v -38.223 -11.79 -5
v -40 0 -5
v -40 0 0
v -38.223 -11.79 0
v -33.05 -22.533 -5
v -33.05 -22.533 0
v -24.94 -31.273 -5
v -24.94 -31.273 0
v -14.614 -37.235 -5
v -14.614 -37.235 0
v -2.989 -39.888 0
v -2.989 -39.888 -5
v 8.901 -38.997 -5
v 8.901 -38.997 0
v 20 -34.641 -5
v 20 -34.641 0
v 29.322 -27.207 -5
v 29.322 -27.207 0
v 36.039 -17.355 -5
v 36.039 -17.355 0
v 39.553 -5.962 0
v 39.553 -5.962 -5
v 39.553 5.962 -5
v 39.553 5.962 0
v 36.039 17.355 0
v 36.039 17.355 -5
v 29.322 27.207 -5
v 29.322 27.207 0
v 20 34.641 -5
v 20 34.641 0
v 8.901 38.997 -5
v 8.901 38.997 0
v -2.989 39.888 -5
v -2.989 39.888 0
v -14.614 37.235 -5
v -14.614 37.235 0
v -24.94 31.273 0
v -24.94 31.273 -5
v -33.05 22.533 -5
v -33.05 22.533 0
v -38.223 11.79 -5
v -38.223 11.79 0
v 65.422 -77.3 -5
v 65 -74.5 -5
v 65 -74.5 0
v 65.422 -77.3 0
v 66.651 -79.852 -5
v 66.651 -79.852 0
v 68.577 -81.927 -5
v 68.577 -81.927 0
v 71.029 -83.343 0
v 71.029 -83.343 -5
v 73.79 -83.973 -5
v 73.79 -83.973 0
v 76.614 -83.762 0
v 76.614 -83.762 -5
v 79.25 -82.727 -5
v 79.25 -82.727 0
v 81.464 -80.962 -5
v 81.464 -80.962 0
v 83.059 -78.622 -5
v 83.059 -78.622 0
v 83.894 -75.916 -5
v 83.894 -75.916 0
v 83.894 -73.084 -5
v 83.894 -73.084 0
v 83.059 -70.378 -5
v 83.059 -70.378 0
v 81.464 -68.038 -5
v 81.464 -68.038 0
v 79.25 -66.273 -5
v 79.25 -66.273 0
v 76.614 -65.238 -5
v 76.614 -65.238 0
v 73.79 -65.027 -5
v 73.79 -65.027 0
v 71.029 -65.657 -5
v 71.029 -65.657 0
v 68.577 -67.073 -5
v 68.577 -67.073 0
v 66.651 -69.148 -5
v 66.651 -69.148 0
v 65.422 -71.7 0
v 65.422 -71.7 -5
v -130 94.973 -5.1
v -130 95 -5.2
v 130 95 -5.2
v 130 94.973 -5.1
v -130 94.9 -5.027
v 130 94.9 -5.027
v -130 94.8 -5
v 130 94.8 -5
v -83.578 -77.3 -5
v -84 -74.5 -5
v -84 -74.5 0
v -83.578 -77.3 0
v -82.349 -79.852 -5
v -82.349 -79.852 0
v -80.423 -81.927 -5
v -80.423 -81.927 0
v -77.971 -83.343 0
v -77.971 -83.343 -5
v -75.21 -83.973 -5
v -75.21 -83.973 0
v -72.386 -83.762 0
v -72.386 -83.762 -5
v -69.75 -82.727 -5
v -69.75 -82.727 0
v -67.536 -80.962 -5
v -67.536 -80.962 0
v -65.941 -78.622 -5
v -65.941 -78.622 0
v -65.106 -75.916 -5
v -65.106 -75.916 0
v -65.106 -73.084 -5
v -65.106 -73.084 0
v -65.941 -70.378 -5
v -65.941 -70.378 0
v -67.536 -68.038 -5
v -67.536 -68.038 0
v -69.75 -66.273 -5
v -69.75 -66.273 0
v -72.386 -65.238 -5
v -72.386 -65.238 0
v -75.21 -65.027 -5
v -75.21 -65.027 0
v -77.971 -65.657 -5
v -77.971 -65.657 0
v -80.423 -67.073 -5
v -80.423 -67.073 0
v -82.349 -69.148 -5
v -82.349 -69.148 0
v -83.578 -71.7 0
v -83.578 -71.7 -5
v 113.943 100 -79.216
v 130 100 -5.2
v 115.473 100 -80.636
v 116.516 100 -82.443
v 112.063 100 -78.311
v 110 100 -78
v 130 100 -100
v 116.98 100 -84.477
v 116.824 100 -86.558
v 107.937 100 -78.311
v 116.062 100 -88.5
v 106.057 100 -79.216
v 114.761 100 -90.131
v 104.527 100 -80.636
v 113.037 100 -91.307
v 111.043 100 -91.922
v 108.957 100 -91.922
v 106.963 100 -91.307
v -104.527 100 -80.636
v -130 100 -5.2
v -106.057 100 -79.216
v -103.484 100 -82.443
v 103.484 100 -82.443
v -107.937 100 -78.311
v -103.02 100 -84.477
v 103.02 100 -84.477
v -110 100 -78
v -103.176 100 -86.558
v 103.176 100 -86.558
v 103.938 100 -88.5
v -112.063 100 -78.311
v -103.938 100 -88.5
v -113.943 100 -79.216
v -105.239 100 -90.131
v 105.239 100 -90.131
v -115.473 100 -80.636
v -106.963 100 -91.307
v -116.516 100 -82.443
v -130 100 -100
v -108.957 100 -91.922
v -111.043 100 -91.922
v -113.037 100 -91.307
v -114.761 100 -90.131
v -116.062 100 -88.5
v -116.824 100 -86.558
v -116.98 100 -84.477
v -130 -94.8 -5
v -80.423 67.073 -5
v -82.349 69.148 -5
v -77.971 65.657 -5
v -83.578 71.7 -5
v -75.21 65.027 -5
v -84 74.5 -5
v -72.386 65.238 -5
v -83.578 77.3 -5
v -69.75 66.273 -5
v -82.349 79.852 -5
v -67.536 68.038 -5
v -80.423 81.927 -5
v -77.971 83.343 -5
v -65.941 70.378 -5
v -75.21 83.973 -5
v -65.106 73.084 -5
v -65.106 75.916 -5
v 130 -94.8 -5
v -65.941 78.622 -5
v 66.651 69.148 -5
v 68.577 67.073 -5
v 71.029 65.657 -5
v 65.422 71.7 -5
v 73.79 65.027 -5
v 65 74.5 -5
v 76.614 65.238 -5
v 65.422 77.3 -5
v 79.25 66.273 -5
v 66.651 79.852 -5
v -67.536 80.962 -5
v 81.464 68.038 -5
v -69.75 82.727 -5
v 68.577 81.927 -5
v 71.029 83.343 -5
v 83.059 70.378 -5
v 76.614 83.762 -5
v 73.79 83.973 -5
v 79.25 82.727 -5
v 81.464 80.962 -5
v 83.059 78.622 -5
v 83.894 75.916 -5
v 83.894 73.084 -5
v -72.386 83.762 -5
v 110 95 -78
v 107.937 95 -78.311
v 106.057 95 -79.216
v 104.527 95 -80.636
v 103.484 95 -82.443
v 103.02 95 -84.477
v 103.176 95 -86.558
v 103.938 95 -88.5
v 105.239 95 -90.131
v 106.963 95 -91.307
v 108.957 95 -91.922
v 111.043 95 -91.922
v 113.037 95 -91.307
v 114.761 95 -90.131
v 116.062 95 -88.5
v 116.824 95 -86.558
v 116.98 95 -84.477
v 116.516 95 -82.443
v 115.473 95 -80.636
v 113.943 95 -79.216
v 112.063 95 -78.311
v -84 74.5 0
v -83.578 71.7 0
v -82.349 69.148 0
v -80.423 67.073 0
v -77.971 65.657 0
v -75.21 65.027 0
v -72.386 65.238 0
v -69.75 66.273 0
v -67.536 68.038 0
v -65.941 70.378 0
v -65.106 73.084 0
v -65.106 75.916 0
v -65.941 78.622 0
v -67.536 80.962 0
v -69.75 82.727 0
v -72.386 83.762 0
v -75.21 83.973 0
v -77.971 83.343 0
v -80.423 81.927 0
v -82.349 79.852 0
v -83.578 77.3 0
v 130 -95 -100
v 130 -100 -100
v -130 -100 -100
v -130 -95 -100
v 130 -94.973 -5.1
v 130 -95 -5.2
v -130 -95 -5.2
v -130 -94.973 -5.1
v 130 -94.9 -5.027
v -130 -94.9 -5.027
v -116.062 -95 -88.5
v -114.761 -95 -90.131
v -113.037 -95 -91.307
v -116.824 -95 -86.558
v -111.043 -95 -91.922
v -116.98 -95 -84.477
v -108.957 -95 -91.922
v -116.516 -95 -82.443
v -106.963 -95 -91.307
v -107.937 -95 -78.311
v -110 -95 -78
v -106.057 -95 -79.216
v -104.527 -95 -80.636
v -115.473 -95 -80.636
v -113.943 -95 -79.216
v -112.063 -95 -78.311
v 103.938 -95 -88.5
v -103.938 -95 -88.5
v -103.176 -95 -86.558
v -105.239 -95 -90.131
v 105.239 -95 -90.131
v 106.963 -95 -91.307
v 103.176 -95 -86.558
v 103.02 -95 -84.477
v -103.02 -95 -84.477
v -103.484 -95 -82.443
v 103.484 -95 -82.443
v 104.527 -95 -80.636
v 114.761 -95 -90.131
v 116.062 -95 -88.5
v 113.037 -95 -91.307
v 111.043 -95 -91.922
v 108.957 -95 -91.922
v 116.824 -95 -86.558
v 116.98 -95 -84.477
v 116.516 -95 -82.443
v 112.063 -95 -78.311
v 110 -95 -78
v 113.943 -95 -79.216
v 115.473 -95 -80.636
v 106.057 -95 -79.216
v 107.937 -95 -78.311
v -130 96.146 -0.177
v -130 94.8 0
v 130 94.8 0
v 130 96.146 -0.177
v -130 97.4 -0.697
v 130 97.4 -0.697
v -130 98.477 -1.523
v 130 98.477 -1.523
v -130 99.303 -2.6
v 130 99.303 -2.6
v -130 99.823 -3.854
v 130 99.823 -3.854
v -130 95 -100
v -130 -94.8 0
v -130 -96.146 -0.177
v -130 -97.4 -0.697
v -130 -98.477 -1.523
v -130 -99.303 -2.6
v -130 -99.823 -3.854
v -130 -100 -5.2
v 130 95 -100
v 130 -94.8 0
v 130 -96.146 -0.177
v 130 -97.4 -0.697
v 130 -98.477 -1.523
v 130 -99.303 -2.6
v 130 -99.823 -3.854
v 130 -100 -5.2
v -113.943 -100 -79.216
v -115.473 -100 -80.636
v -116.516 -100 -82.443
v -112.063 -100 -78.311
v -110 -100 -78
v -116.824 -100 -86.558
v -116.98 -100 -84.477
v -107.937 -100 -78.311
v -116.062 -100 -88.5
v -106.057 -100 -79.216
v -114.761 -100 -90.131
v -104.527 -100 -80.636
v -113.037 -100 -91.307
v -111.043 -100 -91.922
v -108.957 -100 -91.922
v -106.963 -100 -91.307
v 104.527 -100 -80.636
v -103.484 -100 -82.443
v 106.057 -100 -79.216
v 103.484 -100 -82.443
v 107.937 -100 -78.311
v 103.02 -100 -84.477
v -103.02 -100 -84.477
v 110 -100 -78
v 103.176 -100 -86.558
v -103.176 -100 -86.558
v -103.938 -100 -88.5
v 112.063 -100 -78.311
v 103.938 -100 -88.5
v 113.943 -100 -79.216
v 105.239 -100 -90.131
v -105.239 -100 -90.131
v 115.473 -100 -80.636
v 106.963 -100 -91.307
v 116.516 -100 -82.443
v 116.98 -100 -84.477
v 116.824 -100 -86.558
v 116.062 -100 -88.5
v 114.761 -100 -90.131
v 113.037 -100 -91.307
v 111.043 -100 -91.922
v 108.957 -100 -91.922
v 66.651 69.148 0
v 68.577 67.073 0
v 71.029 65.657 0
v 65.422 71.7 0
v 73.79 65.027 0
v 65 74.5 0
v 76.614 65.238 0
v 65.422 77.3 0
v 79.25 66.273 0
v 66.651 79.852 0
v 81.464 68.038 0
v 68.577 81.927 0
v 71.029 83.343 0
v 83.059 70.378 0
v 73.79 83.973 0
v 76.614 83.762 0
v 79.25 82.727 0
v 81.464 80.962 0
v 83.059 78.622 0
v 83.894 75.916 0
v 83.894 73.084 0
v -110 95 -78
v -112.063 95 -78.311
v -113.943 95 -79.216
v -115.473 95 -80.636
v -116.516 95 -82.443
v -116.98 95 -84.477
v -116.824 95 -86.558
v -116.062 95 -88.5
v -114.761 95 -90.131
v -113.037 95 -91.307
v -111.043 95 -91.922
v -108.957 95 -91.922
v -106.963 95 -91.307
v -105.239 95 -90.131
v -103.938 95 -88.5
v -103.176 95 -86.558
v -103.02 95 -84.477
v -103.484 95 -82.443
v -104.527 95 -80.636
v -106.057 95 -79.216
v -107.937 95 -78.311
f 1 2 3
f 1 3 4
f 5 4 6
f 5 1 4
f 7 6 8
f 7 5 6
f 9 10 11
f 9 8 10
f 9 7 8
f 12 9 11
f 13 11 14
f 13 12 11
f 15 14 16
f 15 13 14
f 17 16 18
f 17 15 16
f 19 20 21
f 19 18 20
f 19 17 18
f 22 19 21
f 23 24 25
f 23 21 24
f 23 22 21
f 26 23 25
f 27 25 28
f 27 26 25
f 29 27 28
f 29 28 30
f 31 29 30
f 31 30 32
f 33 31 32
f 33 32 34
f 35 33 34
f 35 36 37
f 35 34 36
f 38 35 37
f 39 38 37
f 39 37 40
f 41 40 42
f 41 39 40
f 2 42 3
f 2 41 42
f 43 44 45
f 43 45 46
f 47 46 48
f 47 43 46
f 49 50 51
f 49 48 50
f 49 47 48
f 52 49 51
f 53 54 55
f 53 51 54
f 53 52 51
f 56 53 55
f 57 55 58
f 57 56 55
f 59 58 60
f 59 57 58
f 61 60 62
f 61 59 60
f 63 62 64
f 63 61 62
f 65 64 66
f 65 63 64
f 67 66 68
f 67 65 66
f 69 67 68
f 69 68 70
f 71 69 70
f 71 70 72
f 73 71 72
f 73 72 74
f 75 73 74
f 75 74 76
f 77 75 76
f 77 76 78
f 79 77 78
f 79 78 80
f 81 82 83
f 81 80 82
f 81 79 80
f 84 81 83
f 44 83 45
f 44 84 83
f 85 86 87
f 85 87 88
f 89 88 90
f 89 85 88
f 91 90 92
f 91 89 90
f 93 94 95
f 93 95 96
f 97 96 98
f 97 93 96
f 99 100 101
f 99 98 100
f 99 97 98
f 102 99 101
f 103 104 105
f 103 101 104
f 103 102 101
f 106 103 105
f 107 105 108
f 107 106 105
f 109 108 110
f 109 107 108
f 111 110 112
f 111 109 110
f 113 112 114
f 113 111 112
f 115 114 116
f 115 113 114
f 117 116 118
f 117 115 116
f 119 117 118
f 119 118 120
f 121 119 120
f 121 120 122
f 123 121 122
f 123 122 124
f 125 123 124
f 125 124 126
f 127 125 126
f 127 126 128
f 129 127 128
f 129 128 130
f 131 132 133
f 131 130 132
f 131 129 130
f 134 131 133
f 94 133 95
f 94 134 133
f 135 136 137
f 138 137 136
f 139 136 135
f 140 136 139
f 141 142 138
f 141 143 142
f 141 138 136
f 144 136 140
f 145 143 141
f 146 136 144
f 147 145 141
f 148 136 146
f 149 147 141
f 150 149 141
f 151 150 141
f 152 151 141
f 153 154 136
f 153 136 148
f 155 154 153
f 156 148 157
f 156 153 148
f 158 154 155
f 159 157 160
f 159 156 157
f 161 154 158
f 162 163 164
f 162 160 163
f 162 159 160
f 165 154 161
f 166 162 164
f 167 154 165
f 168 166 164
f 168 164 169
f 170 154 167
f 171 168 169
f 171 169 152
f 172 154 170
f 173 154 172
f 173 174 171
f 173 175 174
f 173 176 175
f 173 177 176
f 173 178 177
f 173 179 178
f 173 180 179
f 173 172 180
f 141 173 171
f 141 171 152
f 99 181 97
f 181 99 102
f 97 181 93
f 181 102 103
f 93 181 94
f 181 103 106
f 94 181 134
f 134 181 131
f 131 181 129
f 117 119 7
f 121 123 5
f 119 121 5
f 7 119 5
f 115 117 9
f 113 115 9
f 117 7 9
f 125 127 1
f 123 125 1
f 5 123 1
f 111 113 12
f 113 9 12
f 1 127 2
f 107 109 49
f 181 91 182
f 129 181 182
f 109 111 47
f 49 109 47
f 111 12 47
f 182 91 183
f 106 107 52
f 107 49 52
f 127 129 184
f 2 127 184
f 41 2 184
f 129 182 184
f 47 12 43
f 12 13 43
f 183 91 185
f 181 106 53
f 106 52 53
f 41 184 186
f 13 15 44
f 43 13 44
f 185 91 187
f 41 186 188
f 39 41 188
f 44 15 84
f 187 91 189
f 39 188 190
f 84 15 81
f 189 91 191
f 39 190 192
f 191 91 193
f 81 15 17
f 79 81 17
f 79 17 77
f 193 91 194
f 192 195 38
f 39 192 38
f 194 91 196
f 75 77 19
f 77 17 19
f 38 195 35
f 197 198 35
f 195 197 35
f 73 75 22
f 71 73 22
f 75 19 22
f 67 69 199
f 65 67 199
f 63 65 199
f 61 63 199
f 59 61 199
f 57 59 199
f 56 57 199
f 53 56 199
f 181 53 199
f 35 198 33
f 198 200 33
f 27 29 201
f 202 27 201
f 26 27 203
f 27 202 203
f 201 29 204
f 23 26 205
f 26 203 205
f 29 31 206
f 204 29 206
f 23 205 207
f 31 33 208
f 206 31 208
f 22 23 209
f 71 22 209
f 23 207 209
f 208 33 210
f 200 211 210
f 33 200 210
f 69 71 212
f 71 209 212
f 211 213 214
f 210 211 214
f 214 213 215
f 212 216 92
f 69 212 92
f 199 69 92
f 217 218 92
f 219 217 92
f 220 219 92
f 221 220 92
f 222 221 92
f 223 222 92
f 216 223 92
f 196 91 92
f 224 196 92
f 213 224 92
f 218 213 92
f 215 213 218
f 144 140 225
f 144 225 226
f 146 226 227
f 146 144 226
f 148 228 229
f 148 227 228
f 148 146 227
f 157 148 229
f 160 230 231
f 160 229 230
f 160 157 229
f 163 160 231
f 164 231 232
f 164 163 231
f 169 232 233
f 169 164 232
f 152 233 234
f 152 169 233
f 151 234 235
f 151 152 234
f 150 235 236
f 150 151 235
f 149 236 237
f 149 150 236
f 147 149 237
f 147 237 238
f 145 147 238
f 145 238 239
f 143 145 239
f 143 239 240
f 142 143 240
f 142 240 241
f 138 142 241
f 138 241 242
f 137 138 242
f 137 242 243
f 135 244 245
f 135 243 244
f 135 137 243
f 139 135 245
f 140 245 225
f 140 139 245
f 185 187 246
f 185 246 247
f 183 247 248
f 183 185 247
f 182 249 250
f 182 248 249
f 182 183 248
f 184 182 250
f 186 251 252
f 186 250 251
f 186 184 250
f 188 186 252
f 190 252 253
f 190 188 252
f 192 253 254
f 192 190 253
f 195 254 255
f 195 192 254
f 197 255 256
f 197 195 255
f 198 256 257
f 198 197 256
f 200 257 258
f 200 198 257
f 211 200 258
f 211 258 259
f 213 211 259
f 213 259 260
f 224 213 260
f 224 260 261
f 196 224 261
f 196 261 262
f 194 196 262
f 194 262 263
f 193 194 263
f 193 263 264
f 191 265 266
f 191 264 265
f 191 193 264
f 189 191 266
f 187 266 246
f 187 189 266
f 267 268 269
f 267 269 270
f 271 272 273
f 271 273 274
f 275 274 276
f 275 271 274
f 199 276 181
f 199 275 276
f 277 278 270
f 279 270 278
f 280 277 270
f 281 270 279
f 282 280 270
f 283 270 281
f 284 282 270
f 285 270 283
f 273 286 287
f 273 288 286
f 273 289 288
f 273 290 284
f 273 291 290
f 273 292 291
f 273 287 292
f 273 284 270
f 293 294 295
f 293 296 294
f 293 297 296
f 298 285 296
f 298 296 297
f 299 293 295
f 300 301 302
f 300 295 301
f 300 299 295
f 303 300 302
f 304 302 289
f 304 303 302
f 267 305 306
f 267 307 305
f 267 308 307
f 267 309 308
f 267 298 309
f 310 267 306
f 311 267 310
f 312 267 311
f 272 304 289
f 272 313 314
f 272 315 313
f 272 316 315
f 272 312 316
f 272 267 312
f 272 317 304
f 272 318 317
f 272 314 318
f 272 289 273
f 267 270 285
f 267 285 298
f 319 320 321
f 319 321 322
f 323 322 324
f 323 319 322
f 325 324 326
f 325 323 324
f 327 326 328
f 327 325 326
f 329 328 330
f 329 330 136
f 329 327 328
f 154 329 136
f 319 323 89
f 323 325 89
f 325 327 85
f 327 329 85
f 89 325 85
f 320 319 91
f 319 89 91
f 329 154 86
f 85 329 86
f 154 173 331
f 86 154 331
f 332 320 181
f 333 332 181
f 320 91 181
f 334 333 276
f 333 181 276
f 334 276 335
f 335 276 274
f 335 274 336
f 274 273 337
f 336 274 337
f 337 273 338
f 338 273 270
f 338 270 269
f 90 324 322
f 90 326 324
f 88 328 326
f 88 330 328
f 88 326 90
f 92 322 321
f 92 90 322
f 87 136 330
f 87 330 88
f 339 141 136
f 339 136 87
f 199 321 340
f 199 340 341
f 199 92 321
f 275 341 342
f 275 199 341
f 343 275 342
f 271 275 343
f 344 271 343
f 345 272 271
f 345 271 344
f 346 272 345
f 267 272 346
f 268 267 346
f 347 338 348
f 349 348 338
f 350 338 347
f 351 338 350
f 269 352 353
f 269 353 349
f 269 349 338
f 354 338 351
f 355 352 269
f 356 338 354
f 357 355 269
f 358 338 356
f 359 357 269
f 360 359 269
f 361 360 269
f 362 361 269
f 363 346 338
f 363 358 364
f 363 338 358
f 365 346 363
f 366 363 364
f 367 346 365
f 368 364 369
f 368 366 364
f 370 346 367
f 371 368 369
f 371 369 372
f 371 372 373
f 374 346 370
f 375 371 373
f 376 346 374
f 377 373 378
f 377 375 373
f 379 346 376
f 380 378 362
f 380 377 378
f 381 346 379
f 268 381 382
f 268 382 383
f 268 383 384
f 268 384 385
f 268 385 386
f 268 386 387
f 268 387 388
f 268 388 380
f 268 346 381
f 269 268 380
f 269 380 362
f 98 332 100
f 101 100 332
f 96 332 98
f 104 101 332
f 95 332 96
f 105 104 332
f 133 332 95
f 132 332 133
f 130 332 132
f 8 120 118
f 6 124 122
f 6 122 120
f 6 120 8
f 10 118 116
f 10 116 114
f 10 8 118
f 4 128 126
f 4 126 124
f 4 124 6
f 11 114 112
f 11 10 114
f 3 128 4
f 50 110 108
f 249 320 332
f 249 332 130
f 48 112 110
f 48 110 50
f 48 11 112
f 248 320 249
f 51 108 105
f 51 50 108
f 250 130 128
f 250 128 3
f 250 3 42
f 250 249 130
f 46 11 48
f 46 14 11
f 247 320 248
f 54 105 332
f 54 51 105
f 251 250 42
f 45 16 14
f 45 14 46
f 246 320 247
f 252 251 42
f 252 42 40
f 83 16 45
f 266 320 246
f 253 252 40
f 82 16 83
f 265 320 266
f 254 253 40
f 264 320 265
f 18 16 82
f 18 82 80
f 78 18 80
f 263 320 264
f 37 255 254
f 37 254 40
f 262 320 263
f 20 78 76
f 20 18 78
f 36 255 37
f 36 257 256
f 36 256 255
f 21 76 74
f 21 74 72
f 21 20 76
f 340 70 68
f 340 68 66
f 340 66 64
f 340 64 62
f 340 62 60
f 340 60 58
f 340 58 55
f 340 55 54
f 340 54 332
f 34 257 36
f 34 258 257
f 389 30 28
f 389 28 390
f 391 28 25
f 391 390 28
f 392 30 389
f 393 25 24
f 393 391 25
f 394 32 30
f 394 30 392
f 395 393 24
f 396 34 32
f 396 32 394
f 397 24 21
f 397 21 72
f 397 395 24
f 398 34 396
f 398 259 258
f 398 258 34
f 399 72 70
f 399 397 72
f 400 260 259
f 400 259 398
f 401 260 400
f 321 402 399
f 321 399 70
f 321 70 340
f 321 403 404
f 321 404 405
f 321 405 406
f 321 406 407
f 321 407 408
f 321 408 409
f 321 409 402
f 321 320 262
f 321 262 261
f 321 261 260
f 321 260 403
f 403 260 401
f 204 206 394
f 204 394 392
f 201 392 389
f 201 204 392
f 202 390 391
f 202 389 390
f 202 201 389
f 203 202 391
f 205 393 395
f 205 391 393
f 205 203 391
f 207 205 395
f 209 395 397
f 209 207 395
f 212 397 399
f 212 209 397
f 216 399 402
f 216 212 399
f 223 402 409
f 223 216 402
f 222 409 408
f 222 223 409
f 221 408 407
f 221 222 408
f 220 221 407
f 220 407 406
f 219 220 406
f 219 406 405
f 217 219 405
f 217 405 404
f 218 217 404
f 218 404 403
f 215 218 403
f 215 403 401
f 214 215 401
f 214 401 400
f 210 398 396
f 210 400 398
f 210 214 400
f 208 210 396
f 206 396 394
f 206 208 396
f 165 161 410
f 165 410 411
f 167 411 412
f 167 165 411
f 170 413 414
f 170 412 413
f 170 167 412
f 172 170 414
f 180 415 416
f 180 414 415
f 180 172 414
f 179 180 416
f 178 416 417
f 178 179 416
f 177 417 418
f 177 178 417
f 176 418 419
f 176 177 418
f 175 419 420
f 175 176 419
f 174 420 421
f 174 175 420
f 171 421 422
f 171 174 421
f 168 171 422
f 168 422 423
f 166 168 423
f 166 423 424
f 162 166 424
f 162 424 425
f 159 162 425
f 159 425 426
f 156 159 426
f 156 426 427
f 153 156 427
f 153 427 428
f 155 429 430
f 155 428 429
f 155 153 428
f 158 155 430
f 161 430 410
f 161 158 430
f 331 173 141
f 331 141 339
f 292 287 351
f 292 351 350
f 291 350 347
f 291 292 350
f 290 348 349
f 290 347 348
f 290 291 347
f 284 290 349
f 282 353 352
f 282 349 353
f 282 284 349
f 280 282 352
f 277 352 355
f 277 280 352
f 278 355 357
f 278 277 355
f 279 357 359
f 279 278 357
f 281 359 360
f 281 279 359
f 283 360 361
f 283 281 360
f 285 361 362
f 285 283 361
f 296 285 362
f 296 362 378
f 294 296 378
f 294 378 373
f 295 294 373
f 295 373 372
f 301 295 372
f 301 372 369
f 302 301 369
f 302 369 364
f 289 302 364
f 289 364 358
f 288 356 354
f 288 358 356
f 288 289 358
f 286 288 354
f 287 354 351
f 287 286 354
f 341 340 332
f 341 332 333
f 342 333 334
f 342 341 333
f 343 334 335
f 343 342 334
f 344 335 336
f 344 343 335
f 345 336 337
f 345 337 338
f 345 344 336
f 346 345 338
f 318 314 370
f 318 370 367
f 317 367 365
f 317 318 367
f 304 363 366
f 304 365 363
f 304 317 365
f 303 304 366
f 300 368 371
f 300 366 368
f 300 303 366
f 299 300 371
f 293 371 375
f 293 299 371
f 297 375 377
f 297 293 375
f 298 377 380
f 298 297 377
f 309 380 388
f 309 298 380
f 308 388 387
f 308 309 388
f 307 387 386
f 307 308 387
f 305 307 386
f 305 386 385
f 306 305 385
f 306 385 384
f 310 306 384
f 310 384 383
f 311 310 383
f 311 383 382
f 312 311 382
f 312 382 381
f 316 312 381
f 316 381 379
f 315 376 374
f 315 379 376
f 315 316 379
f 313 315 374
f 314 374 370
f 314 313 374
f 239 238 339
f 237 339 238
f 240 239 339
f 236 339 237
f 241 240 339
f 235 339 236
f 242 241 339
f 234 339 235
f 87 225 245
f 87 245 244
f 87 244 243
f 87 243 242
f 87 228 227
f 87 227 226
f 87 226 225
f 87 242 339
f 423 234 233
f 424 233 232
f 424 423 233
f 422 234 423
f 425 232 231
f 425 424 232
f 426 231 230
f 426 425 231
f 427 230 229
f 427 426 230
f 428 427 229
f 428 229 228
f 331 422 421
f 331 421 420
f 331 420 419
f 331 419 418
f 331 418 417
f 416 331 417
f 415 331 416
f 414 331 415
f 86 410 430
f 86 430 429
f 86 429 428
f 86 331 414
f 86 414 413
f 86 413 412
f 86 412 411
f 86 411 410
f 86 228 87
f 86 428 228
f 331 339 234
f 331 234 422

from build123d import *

# Parameters (mm, degrees)
SKETCH1_W                    = 260
SKETCH1_H                    = 200
BASE_FLANGE1_DEPTH           = 5
EDGE_FLANGE1_STRIP_W         = 20.4
EDGE_FLANGE1_STRIP_H         = 5
EDGE_FLANGE1_STRIP_CUT_DEPTH = 260
EDGE_FLANGE1_DEPTH           = 260
EDGE_FLANGE2_STRIP_W         = 20.4
EDGE_FLANGE2_STRIP_H         = 5
EDGE_FLANGE2_STRIP_CUT_DEPTH = 260
EDGE_FLANGE2_DEPTH           = 260
CUT_EXTRUDE1_DEPTH           = 193.093727123
CUT_EXTRUDE1_DEPTH_BACK      = 193.093727123
SKETCH12_R                   = 40
CUT_EXTRUDE2_DEPTH           = 193.093727123
CUT_EXTRUDE2_DEPTH_BACK      = 193.093727123
SKETCH13_R                   = 9.5
CUT_EXTRUDE3_DEPTH           = 259.650343128
CUT_EXTRUDE3_DEPTH_BACK      = 259.650343128
SKETCH14_R                   = 7


# Sheet-metal steps are written as plain solids
with BuildPart() as part:
    # Sketch1 → Base-Flange1 (new body)
    with BuildSketch(Plane.XY):
        Rectangle(SKETCH1_W, SKETCH1_H)
    extrude(amount=-BASE_FLANGE1_DEPTH)

    # Edge-Flange1 strip (across the edge) → Edge-Flange1 strip cut (cut)
    with BuildSketch(Plane(origin=(-130, 100, -5), x_dir=(0, -1, 0), z_dir=(1, 0, 0))):
        with Locations((-5, -2.5)):
            Rectangle(EDGE_FLANGE1_STRIP_W, EDGE_FLANGE1_STRIP_H)
    extrude(amount=EDGE_FLANGE1_STRIP_CUT_DEPTH, mode=Mode.SUBTRACT)

    # Edge-Flange1 section (across the edge) → Edge-Flange1 (add)
    with BuildSketch(Plane(origin=(-130, 100, -5), x_dir=(0, -1, 0), z_dir=(1, 0, 0))):
        with BuildLine():
            Line((0, 0.2), (0, 95))
            Line((0, 95), (5, 95))
            Line((5, 95), (5, 0.2))
            ThreePointArc((5, 0.2), (5.058578644, 0.058578644), (5.2, 0))
            Line((5.2, 0), (5.2, -5))
            ThreePointArc((5.2, -5), (1.523044738, -3.476955262), (0, 0.2))
        make_face()
    extrude(amount=EDGE_FLANGE1_DEPTH)

    # Edge-Flange2 strip (across the edge) → Edge-Flange2 strip cut (cut)
    with BuildSketch(Plane(origin=(130, -100, -5), x_dir=(0, 1, 0), z_dir=(-1, 0, 0))):
        with Locations((-5, -2.5)):
            Rectangle(EDGE_FLANGE2_STRIP_W, EDGE_FLANGE2_STRIP_H)
    extrude(amount=EDGE_FLANGE2_STRIP_CUT_DEPTH, mode=Mode.SUBTRACT)

    # Edge-Flange2 section (across the edge) → Edge-Flange2 (add)
    with BuildSketch(Plane(origin=(130, -100, -5), x_dir=(0, 1, 0), z_dir=(-1, 0, 0))):
        with BuildLine():
            Line((0, 0.2), (0, 95))
            Line((0, 95), (5, 95))
            Line((5, 95), (5, 0.2))
            ThreePointArc((5, 0.2), (5.058578644, 0.058578644), (5.2, 0))
            Line((5.2, 0), (5.2, -5))
            ThreePointArc((5.2, -5), (1.523044738, -3.476955262), (0, 0.2))
        make_face()
    extrude(amount=EDGE_FLANGE2_DEPTH)

    # Sketch12 → Cut-Extrude1 (cut, two sides: drawn at the far end of the back side and taken through both)
    with BuildSketch(Plane.XY.offset(-CUT_EXTRUDE1_DEPTH_BACK)):
        with Locations(Location((0, 0, 0), (0, 0, 180))):
            Circle(SKETCH12_R)
    extrude(amount=CUT_EXTRUDE1_DEPTH + CUT_EXTRUDE1_DEPTH_BACK, mode=Mode.SUBTRACT)

    # Sketch13 → Cut-Extrude2 (cut, two sides: drawn at the far end of the back side and taken through both)
    with BuildSketch(Plane.XY.offset(-CUT_EXTRUDE2_DEPTH_BACK)):
        with Locations(Location((74.5, 74.5, 0), (0, 0, 180))):
            Circle(SKETCH13_R)
        with Locations(Location((-74.5, 74.5, 0), (0, 0, 180))):
            Circle(SKETCH13_R)
        with Locations(Location((-74.5, -74.5, 0), (0, 0, 180))):
            Circle(SKETCH13_R)
        with Locations(Location((74.5, -74.5, 0), (0, 0, 180))):
            Circle(SKETCH13_R)
    extrude(amount=CUT_EXTRUDE2_DEPTH + CUT_EXTRUDE2_DEPTH_BACK, mode=Mode.SUBTRACT)

    # Sketch14 → Cut-Extrude3 (cut, two sides: drawn at the far end of the back side and taken through both)
    with BuildSketch(Plane(origin=(0, -100, 0), x_dir=(-1, 0, 0), z_dir=(0, -1, 0)).offset(-CUT_EXTRUDE3_DEPTH_BACK)):
        with Locations(Location((110, 85, 0), (0, 0, 270))):
            Circle(SKETCH14_R)
        with Locations(Location((-110, 85, 0), (0, 0, 270))):
            Circle(SKETCH14_R)
    extrude(amount=CUT_EXTRUDE3_DEPTH + CUT_EXTRUDE3_DEPTH_BACK, mode=Mode.SUBTRACT)


solid = part.part
